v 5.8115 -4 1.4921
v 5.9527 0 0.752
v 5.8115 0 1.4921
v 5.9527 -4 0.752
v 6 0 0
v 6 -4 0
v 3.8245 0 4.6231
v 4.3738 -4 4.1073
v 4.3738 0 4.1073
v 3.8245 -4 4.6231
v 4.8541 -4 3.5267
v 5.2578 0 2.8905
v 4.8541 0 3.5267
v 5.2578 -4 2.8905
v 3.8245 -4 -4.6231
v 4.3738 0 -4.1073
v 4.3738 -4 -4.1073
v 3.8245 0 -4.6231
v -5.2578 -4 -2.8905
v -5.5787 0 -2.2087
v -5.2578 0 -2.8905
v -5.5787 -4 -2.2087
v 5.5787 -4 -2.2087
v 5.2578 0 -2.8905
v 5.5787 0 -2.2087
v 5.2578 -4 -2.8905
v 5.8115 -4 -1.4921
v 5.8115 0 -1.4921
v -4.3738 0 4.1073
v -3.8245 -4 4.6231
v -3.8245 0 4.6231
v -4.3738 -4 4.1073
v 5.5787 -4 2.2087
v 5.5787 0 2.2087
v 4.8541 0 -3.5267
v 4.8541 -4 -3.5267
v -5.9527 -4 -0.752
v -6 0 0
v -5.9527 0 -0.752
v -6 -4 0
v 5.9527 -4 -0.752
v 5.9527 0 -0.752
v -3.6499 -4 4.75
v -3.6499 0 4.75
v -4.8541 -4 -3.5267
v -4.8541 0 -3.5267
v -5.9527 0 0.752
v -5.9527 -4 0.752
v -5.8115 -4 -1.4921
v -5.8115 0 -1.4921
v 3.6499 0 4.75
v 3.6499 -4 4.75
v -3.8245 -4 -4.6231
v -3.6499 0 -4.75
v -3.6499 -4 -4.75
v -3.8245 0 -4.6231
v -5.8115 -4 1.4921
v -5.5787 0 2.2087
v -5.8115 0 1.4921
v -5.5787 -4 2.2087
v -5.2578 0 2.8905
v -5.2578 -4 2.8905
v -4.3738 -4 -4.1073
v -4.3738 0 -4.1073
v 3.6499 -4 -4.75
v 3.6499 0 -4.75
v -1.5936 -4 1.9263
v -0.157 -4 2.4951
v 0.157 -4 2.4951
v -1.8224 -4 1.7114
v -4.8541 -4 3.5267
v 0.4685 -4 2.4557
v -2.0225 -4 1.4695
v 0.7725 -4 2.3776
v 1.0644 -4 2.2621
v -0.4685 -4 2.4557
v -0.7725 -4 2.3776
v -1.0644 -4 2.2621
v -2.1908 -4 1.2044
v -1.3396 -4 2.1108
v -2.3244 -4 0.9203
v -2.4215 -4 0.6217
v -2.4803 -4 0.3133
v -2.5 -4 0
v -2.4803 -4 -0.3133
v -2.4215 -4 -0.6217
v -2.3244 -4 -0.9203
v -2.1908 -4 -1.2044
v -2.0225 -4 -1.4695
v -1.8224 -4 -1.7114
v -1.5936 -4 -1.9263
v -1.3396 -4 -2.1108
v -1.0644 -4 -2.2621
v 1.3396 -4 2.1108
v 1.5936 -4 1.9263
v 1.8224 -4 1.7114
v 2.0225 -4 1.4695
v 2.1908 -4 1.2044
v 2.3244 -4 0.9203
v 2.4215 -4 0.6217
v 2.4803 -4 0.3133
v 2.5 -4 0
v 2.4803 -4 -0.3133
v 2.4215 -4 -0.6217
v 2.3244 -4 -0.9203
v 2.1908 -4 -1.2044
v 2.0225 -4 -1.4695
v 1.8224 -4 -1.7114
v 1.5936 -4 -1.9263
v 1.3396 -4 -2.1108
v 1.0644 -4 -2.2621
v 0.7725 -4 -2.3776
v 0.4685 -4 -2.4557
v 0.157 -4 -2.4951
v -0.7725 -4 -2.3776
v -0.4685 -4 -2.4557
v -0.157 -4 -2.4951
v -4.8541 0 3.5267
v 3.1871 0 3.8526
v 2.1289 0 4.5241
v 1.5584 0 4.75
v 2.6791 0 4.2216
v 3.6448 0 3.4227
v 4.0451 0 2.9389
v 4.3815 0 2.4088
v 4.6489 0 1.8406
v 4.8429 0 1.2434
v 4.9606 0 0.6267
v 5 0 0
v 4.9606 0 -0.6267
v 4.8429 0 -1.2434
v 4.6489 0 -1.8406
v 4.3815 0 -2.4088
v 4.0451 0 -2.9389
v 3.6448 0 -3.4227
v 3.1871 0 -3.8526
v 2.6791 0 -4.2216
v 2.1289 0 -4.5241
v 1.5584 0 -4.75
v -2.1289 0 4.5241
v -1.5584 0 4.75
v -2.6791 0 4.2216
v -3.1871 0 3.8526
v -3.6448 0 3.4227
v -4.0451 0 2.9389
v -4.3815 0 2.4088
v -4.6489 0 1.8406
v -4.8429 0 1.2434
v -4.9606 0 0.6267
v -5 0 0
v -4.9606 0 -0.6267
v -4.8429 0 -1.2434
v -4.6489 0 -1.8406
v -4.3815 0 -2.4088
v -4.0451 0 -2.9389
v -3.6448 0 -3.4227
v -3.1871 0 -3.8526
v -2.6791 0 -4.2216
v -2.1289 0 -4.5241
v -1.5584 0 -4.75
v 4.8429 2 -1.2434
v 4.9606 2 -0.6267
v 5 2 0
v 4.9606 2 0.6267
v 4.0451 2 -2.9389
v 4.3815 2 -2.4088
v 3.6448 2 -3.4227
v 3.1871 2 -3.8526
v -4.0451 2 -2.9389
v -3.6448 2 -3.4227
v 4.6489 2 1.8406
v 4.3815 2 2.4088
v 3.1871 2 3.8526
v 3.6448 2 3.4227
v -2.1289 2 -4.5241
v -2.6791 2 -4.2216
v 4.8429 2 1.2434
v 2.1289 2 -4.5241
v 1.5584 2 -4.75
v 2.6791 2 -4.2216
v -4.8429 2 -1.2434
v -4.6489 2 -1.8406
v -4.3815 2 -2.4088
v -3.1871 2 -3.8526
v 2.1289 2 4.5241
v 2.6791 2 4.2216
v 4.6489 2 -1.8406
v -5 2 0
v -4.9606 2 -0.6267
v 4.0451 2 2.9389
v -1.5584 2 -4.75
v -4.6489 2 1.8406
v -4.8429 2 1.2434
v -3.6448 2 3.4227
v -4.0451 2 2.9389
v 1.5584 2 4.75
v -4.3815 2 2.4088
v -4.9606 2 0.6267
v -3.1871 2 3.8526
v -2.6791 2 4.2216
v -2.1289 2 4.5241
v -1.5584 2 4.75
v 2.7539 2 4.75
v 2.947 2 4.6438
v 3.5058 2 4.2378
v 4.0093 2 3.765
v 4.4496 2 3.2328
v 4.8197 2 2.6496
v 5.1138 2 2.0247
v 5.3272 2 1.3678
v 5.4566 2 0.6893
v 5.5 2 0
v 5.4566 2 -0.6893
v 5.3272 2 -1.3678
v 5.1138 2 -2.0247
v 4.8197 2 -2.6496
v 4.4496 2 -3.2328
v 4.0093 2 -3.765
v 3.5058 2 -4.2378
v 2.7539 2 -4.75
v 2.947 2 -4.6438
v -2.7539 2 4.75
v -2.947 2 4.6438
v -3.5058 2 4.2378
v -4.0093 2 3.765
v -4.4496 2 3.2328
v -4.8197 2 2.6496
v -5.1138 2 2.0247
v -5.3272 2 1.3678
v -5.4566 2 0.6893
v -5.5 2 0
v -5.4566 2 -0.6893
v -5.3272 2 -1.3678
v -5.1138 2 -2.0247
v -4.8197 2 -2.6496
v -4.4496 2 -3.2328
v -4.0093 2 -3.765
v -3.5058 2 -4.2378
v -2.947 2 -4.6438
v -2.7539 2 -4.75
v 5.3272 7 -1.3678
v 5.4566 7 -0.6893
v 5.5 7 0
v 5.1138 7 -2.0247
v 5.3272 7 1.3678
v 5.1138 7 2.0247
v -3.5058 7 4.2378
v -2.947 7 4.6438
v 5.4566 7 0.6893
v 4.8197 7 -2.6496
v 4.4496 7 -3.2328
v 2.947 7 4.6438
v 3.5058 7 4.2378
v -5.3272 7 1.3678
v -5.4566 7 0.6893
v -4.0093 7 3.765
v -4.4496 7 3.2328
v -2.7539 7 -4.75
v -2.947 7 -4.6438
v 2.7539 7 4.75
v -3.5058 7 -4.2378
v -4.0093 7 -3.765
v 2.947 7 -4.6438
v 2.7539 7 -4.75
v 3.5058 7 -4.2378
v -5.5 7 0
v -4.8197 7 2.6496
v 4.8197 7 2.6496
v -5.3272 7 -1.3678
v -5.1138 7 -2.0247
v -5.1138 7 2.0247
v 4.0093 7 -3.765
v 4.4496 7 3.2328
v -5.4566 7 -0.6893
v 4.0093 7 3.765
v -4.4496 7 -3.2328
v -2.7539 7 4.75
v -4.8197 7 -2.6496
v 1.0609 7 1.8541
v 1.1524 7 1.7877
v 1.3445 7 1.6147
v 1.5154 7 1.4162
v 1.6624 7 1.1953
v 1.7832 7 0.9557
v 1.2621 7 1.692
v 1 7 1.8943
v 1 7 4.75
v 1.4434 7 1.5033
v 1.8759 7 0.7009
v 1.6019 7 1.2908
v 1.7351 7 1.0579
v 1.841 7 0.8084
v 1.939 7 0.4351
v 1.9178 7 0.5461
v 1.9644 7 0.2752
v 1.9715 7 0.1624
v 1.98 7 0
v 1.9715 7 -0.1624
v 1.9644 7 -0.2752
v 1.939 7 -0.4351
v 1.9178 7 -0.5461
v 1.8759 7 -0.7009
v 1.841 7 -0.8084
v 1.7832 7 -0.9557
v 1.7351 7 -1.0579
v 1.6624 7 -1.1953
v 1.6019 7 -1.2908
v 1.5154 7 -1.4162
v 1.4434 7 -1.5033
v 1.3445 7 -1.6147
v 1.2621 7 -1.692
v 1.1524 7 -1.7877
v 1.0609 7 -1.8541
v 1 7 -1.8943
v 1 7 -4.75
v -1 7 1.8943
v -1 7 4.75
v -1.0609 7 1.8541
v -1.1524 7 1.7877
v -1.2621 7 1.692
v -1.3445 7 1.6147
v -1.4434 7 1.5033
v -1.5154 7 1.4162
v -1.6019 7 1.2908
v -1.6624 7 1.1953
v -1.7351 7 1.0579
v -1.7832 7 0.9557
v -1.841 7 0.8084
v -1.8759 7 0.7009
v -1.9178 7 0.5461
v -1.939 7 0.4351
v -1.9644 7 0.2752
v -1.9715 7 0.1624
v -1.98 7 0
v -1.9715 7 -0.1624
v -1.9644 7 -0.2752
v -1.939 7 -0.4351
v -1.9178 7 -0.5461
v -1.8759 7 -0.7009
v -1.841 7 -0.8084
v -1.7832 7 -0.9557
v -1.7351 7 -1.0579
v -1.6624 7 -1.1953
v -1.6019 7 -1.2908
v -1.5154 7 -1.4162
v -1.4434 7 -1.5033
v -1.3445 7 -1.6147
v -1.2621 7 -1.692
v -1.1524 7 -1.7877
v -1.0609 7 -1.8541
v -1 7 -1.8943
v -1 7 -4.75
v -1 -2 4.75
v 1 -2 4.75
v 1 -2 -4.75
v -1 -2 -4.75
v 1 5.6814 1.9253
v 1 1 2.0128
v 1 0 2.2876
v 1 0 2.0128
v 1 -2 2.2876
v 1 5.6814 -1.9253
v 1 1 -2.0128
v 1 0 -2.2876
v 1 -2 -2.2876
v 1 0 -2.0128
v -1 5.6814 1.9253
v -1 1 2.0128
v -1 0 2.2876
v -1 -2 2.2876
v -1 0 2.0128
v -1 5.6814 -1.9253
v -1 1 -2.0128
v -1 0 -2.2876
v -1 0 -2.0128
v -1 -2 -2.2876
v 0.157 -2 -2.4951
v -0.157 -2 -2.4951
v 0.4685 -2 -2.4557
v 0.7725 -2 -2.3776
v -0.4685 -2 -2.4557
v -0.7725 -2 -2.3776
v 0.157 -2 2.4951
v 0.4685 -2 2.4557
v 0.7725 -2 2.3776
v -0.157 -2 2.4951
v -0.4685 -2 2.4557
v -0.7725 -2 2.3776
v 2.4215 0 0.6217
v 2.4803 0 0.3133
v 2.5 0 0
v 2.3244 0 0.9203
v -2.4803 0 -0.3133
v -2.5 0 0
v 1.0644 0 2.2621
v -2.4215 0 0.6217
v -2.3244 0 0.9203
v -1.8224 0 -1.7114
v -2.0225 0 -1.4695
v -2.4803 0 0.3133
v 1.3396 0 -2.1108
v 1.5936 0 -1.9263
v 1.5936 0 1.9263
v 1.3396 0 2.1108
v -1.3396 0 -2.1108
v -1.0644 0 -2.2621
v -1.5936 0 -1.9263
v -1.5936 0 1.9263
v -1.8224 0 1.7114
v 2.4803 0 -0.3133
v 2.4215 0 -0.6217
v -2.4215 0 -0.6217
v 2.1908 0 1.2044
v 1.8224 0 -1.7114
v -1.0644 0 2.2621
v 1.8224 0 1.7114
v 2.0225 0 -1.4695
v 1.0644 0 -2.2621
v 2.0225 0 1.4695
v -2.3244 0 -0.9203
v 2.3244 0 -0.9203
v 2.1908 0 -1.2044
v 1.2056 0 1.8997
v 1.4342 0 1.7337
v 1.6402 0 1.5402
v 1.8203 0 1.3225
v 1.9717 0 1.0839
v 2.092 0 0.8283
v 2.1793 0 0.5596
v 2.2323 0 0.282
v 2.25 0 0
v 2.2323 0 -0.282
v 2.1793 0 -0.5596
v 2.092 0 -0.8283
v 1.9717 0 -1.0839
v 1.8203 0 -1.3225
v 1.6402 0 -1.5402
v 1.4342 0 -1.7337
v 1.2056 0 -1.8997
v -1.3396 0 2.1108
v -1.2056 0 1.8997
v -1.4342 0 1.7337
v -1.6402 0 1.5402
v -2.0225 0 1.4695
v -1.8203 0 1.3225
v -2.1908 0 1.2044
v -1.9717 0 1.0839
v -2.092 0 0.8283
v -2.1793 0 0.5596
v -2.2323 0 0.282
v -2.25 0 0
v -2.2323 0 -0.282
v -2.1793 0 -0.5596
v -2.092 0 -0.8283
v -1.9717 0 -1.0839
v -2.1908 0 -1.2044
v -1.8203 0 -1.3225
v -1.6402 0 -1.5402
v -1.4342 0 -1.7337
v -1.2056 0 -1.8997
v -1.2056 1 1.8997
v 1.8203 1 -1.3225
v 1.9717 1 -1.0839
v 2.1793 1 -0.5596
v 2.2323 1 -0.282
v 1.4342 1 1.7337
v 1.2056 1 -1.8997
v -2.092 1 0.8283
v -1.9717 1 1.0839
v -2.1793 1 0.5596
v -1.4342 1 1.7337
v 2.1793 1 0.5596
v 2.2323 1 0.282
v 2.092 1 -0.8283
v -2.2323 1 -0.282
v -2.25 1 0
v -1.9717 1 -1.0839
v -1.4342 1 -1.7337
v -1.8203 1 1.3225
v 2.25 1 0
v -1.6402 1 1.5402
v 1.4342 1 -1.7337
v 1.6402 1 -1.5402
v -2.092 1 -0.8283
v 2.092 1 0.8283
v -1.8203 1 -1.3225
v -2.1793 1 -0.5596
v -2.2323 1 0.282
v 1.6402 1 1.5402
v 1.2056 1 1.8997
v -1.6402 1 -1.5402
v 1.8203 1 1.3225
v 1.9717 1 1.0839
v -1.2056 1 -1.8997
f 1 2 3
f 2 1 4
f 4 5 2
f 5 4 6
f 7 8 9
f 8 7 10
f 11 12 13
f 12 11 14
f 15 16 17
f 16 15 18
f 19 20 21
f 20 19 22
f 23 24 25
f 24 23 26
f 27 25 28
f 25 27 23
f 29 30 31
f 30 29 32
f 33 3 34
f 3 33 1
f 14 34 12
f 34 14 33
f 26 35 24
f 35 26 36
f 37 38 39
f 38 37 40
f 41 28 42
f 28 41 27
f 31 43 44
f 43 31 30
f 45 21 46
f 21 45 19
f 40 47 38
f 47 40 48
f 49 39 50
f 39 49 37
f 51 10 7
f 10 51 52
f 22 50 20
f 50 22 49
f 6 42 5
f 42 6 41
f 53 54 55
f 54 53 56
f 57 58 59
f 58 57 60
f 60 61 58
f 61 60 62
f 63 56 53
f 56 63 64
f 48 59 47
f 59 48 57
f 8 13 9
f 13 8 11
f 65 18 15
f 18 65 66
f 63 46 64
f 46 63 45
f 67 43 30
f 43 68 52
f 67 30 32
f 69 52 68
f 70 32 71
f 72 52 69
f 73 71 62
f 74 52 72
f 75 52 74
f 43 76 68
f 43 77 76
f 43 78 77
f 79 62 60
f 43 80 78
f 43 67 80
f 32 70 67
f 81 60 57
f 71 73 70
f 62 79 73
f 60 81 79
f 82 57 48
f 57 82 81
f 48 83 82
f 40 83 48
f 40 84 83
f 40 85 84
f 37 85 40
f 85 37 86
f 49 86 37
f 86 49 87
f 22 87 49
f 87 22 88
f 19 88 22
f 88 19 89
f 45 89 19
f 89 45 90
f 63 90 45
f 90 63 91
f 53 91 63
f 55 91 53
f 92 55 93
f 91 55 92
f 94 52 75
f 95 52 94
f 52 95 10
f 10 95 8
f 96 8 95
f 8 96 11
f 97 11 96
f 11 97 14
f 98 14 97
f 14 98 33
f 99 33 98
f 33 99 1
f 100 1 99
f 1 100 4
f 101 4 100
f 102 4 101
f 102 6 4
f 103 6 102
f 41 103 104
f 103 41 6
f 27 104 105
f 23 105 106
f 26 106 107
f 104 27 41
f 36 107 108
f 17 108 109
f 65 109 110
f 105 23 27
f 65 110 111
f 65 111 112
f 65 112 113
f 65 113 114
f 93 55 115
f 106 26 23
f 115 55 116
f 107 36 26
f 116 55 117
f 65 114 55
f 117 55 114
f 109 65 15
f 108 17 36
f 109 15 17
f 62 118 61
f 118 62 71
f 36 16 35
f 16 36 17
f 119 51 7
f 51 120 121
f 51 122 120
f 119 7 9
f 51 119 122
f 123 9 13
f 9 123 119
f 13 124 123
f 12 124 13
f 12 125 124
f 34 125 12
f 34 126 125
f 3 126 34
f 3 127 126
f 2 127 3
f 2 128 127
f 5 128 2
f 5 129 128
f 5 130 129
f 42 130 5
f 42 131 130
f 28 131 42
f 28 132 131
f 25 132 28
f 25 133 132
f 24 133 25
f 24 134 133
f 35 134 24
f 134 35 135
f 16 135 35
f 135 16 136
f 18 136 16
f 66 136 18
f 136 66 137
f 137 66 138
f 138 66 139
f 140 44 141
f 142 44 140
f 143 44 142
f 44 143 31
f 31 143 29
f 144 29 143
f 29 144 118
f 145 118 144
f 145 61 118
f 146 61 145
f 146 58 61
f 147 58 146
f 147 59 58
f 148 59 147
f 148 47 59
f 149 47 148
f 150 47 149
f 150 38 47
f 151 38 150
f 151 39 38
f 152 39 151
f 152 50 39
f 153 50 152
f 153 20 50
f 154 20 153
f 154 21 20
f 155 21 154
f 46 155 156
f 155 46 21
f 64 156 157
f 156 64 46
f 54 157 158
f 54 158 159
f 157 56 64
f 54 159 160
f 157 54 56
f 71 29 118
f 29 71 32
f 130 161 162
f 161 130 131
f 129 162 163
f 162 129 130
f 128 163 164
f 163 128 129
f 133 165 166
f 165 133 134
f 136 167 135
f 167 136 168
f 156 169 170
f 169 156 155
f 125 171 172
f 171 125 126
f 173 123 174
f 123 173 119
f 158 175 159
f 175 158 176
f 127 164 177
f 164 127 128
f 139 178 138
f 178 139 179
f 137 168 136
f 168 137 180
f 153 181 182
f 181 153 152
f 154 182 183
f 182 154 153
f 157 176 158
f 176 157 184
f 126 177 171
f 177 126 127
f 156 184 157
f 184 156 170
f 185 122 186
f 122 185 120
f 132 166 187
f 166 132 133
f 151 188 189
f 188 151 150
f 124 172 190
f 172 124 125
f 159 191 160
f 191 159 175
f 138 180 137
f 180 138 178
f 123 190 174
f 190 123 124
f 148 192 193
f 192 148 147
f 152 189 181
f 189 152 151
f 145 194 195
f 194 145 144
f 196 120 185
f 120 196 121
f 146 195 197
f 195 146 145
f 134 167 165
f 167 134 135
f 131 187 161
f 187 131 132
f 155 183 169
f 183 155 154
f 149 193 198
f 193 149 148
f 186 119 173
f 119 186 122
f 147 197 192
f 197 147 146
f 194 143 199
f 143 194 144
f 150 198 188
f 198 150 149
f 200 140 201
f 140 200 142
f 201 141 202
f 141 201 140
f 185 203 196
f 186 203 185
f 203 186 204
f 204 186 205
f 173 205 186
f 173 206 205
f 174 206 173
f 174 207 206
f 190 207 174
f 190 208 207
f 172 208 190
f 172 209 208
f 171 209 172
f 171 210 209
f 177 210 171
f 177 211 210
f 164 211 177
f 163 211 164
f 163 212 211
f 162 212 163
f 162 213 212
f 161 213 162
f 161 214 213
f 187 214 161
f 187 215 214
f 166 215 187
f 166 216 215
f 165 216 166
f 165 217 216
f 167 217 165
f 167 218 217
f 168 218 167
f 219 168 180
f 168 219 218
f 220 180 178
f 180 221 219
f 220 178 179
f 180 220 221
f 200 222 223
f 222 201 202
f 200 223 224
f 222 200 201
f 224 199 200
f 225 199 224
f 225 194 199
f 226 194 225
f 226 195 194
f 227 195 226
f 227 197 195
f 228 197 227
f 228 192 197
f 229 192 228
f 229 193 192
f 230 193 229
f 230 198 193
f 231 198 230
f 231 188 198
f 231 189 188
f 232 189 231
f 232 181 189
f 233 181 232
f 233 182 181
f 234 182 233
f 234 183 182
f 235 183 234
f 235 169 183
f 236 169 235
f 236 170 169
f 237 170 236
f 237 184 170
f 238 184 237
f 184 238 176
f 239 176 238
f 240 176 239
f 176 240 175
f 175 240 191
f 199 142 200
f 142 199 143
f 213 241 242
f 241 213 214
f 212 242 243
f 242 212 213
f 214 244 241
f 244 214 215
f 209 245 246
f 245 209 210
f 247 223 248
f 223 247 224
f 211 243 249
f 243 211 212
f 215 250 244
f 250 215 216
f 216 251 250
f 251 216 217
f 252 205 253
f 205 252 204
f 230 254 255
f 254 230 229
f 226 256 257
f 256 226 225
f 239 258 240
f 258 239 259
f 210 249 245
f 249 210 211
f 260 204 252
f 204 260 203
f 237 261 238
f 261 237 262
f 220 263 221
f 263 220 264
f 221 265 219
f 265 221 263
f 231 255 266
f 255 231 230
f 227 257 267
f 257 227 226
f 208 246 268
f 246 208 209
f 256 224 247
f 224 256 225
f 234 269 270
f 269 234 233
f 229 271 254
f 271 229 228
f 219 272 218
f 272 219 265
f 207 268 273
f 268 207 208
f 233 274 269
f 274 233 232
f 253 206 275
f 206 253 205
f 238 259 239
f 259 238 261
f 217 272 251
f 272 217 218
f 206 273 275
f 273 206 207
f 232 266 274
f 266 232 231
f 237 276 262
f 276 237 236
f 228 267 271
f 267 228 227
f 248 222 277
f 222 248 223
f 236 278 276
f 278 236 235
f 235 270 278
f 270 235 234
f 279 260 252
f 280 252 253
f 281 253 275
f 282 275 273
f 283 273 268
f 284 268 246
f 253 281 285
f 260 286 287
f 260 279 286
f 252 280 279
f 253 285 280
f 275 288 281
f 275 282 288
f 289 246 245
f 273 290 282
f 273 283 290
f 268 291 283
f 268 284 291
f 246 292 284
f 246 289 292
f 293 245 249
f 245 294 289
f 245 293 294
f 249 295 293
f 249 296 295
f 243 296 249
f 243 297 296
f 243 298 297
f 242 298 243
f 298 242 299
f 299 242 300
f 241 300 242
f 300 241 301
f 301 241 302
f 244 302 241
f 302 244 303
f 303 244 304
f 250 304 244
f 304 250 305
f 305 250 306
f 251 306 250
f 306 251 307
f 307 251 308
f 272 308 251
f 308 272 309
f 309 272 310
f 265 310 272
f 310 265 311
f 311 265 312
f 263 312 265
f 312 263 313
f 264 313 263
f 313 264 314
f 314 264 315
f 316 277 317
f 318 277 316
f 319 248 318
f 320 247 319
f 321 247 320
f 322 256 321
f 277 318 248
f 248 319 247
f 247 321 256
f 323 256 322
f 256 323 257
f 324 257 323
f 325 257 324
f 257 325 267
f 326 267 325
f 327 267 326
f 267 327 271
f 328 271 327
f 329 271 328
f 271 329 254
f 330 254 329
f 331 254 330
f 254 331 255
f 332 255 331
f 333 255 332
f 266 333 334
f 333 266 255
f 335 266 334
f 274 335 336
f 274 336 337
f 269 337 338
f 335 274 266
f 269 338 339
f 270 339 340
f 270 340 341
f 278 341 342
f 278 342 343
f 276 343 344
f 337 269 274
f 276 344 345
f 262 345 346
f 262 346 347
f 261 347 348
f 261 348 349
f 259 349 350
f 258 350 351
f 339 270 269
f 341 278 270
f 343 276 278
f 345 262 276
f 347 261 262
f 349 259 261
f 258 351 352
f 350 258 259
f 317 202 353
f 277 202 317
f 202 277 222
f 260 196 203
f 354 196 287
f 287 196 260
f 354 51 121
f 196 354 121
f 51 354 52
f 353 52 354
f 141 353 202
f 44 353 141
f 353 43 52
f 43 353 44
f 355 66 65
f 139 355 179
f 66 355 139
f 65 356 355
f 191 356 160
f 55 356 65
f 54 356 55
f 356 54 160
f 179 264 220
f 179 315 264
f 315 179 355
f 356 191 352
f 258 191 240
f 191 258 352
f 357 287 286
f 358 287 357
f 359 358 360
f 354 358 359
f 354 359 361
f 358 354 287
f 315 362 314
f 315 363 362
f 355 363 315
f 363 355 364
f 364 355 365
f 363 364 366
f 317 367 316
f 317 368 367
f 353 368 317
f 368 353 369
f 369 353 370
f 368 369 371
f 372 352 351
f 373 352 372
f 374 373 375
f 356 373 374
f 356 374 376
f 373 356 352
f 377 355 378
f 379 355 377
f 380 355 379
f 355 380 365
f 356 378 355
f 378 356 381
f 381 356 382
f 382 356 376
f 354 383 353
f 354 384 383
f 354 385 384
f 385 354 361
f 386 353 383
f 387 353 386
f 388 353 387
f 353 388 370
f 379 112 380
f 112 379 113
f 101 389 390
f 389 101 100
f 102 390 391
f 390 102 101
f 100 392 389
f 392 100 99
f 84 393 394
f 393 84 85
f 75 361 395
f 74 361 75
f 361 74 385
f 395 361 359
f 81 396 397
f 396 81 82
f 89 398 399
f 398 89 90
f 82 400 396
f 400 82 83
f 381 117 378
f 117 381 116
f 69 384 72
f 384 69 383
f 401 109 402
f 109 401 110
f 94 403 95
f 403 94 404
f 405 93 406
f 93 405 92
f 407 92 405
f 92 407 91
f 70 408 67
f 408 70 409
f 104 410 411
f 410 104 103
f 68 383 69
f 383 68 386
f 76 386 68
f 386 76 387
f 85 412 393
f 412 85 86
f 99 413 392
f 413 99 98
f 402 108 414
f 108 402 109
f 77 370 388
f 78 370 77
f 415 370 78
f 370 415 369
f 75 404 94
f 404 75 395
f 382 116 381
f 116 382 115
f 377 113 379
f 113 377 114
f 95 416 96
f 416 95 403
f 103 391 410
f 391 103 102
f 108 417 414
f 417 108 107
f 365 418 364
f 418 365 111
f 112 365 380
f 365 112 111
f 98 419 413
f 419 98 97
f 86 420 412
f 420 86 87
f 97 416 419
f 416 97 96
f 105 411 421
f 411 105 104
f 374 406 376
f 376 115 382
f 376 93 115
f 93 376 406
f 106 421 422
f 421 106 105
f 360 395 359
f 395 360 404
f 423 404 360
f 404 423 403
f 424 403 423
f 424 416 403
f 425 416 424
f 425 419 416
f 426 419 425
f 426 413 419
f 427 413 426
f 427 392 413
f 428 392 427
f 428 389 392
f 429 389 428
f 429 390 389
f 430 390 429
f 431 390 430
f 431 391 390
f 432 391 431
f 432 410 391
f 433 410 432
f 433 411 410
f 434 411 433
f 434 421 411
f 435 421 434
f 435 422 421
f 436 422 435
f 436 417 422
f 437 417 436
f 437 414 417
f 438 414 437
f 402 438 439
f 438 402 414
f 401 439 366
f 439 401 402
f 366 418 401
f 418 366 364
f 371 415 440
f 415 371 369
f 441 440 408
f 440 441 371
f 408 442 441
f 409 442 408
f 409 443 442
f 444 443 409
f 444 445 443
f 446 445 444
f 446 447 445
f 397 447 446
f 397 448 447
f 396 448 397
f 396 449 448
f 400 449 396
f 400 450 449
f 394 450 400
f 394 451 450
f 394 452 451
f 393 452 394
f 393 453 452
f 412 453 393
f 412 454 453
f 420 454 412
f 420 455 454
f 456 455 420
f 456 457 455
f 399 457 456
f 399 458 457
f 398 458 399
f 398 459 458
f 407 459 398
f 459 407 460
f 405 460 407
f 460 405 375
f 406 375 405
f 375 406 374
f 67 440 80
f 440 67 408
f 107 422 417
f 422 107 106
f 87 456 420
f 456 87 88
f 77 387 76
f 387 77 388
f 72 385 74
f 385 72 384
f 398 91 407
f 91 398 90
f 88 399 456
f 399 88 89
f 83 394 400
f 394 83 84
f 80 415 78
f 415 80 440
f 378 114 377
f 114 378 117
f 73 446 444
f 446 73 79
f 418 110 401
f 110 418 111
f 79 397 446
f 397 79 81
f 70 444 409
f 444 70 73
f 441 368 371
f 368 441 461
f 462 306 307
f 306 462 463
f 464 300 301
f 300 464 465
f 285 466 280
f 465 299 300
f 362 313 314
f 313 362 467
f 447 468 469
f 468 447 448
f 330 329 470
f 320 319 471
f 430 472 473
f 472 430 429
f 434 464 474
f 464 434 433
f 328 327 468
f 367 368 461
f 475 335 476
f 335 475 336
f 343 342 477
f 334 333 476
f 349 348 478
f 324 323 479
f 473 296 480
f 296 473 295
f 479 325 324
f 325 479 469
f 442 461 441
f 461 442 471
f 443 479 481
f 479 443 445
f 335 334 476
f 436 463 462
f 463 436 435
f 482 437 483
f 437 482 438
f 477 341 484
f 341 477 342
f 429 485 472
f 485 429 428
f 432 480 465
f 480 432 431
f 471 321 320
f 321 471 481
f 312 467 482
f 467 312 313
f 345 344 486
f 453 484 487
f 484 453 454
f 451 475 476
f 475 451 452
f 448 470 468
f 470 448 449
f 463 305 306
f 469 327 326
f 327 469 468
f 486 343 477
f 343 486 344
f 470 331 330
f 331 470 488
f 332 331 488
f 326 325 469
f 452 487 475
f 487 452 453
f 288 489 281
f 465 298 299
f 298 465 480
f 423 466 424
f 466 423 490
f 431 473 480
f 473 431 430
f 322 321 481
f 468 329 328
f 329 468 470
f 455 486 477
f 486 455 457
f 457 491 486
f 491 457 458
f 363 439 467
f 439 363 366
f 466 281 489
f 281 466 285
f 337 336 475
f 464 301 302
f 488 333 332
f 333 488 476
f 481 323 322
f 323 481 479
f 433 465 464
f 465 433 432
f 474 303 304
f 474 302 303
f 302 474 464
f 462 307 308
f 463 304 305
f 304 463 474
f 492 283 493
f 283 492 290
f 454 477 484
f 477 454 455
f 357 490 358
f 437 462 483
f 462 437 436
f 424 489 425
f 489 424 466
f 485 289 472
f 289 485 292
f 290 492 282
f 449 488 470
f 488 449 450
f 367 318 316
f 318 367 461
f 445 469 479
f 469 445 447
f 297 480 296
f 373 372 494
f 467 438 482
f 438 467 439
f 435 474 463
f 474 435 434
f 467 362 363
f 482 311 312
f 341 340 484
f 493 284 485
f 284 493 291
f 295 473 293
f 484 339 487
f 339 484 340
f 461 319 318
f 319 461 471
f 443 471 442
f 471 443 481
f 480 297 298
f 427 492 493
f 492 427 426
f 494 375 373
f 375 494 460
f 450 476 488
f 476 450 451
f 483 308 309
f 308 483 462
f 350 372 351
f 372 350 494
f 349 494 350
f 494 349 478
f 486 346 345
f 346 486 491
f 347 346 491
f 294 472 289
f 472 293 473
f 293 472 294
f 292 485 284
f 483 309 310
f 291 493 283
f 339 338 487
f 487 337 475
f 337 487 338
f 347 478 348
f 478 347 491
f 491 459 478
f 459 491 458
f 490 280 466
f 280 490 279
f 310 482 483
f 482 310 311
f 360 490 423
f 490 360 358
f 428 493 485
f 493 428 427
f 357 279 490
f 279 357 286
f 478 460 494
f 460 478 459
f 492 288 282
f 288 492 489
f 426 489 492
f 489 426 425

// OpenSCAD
width = 30;
length = 120;
leg = 18;
leg_h = 17;
body_h = 8;
bolt_dia = 5.5;
bolt_head_dia = 9;
bolt_distance = 49;

$fn = 50;

module body() {
    module head() {
        
        head_l = length/2-30;
        
        hull() {
            hull() {
                translate([3/2,1/2,body_h/2]) cube([width,1,body_h], center=true);
                translate([3/2,head_l,0]) cylinder(d=width,h=body_h);
                translate([0,length/2-13/2,0]) cylinder(d=10,h=body_h-2);
            }
            hull() {
                translate([3/2,1/2,(body_h-3)/2+3/2]) cube([width+3,1,body_h-3], center=true);
                translate([3/2,head_l,3/2]) cylinder(d=width+3,h=body_h-3);
                translate([0,length/2-13/2,3/2]) cylinder(d=13,h=body_h-5);
            }
        }
    }
    
    union() {
        head();
        mirror([0,1,0]) head();
    }
}

module hook() {
    
    module notch() {
        _min = 3.5;
        _max = 5;
        
        _scale = 4/6;
        
        pos_x = 13;
        pos_y = 11;
        
        
        union() {
            hull() {
                cylinder(d1=_max,d2=_min,h=2);
                translate([pos_x,pos_y,0]) cylinder(d1=_max+2,d2=_min+2,h=2);
            }
            translate([0,0,2]) hull() {
                cylinder(d=_min,h=body_h-4);
                translate([pos_x,pos_y,0]) cylinder(d=_min+2,h=body_h-4);
            }
            translate([0,0,body_h-2]) hull() {
                cylinder(d1=_min,d2=_max,h=2);
                translate([pos_x,pos_y,0]) cylinder(d1=_min+2,d2=_max+2,h=2);
            }
            translate([pos_x-3,2.2,0]) difference() {
                translate([-1.2,0,0]) cube([5,5,body_h]);
                cylinder(d1=_min,d2=_max,h=2);
                translate([0,0,2]) cylinder(d=_max,h=body_h-4);
                translate([0,0,body_h-2]) cylinder(d1=_max,d2=_min,h=2);
            }
        }
    }

    difference() {
        union() {
            body();
            translate([0,bolt_distance/2,0]) cylinder(d=leg, h=body_h+leg_h);
            translate([0,-bolt_distance/2,0]) cylinder(d=leg, h=body_h+leg_h);
        }
        translate([0,bolt_distance/2,0]) cylinder(d=bolt_head_dia, h=2.4);
        translate([0,-bolt_distance/2,0]) cylinder(d=bolt_head_dia, h=2.4);
        
        translate([0,bolt_distance/2,2.7]) cylinder(d=bolt_dia, h=body_h+leg_h);
        translate([0,-bolt_distance/2,2.7]) cylinder(d=bolt_dia, h=body_h+leg_h);
        
        translate([0,bolt_distance/2,body_h+leg_h-6]) cylinder(d=12.5, h=body_h+leg_h);
        translate([0,-bolt_distance/2,body_h+leg_h-6]) cylinder(d=12.5, h=body_h+leg_h);

        translate([7,10,0]) notch();
        translate([7,-10,0]) notch();
    }
}

module pole_clip() {
    difference() {
        intersection() {
            union() {
                rotate([90,0,0]) cylinder(d=12,h=4);
                rotate([-90,0,0]) cylinder(d=10,h=2);
                translate([0,2,0]) rotate([-90,0,0]) cylinder(d=11,h=5);
            }
            cube([13,20,9.5],center=true);
        }
        translate([0,8,0]) cube([2,20,20],center=true);
        rotate([90,0,0]) cylinder(d=5,h=5);
        rotate([-90,0,0]) hull() {
            cylinder(d=4.5, h=1);
            translate([0,0,10]) scale([1,1.2,1]) cylinder(d=3.6,h=1);
        }
    }
}

module test_notch() {
    intersection() {
        hook();
        cube([30,30,body_h]);
    }
}

//test_notch();
//hook();
pole_clip();
